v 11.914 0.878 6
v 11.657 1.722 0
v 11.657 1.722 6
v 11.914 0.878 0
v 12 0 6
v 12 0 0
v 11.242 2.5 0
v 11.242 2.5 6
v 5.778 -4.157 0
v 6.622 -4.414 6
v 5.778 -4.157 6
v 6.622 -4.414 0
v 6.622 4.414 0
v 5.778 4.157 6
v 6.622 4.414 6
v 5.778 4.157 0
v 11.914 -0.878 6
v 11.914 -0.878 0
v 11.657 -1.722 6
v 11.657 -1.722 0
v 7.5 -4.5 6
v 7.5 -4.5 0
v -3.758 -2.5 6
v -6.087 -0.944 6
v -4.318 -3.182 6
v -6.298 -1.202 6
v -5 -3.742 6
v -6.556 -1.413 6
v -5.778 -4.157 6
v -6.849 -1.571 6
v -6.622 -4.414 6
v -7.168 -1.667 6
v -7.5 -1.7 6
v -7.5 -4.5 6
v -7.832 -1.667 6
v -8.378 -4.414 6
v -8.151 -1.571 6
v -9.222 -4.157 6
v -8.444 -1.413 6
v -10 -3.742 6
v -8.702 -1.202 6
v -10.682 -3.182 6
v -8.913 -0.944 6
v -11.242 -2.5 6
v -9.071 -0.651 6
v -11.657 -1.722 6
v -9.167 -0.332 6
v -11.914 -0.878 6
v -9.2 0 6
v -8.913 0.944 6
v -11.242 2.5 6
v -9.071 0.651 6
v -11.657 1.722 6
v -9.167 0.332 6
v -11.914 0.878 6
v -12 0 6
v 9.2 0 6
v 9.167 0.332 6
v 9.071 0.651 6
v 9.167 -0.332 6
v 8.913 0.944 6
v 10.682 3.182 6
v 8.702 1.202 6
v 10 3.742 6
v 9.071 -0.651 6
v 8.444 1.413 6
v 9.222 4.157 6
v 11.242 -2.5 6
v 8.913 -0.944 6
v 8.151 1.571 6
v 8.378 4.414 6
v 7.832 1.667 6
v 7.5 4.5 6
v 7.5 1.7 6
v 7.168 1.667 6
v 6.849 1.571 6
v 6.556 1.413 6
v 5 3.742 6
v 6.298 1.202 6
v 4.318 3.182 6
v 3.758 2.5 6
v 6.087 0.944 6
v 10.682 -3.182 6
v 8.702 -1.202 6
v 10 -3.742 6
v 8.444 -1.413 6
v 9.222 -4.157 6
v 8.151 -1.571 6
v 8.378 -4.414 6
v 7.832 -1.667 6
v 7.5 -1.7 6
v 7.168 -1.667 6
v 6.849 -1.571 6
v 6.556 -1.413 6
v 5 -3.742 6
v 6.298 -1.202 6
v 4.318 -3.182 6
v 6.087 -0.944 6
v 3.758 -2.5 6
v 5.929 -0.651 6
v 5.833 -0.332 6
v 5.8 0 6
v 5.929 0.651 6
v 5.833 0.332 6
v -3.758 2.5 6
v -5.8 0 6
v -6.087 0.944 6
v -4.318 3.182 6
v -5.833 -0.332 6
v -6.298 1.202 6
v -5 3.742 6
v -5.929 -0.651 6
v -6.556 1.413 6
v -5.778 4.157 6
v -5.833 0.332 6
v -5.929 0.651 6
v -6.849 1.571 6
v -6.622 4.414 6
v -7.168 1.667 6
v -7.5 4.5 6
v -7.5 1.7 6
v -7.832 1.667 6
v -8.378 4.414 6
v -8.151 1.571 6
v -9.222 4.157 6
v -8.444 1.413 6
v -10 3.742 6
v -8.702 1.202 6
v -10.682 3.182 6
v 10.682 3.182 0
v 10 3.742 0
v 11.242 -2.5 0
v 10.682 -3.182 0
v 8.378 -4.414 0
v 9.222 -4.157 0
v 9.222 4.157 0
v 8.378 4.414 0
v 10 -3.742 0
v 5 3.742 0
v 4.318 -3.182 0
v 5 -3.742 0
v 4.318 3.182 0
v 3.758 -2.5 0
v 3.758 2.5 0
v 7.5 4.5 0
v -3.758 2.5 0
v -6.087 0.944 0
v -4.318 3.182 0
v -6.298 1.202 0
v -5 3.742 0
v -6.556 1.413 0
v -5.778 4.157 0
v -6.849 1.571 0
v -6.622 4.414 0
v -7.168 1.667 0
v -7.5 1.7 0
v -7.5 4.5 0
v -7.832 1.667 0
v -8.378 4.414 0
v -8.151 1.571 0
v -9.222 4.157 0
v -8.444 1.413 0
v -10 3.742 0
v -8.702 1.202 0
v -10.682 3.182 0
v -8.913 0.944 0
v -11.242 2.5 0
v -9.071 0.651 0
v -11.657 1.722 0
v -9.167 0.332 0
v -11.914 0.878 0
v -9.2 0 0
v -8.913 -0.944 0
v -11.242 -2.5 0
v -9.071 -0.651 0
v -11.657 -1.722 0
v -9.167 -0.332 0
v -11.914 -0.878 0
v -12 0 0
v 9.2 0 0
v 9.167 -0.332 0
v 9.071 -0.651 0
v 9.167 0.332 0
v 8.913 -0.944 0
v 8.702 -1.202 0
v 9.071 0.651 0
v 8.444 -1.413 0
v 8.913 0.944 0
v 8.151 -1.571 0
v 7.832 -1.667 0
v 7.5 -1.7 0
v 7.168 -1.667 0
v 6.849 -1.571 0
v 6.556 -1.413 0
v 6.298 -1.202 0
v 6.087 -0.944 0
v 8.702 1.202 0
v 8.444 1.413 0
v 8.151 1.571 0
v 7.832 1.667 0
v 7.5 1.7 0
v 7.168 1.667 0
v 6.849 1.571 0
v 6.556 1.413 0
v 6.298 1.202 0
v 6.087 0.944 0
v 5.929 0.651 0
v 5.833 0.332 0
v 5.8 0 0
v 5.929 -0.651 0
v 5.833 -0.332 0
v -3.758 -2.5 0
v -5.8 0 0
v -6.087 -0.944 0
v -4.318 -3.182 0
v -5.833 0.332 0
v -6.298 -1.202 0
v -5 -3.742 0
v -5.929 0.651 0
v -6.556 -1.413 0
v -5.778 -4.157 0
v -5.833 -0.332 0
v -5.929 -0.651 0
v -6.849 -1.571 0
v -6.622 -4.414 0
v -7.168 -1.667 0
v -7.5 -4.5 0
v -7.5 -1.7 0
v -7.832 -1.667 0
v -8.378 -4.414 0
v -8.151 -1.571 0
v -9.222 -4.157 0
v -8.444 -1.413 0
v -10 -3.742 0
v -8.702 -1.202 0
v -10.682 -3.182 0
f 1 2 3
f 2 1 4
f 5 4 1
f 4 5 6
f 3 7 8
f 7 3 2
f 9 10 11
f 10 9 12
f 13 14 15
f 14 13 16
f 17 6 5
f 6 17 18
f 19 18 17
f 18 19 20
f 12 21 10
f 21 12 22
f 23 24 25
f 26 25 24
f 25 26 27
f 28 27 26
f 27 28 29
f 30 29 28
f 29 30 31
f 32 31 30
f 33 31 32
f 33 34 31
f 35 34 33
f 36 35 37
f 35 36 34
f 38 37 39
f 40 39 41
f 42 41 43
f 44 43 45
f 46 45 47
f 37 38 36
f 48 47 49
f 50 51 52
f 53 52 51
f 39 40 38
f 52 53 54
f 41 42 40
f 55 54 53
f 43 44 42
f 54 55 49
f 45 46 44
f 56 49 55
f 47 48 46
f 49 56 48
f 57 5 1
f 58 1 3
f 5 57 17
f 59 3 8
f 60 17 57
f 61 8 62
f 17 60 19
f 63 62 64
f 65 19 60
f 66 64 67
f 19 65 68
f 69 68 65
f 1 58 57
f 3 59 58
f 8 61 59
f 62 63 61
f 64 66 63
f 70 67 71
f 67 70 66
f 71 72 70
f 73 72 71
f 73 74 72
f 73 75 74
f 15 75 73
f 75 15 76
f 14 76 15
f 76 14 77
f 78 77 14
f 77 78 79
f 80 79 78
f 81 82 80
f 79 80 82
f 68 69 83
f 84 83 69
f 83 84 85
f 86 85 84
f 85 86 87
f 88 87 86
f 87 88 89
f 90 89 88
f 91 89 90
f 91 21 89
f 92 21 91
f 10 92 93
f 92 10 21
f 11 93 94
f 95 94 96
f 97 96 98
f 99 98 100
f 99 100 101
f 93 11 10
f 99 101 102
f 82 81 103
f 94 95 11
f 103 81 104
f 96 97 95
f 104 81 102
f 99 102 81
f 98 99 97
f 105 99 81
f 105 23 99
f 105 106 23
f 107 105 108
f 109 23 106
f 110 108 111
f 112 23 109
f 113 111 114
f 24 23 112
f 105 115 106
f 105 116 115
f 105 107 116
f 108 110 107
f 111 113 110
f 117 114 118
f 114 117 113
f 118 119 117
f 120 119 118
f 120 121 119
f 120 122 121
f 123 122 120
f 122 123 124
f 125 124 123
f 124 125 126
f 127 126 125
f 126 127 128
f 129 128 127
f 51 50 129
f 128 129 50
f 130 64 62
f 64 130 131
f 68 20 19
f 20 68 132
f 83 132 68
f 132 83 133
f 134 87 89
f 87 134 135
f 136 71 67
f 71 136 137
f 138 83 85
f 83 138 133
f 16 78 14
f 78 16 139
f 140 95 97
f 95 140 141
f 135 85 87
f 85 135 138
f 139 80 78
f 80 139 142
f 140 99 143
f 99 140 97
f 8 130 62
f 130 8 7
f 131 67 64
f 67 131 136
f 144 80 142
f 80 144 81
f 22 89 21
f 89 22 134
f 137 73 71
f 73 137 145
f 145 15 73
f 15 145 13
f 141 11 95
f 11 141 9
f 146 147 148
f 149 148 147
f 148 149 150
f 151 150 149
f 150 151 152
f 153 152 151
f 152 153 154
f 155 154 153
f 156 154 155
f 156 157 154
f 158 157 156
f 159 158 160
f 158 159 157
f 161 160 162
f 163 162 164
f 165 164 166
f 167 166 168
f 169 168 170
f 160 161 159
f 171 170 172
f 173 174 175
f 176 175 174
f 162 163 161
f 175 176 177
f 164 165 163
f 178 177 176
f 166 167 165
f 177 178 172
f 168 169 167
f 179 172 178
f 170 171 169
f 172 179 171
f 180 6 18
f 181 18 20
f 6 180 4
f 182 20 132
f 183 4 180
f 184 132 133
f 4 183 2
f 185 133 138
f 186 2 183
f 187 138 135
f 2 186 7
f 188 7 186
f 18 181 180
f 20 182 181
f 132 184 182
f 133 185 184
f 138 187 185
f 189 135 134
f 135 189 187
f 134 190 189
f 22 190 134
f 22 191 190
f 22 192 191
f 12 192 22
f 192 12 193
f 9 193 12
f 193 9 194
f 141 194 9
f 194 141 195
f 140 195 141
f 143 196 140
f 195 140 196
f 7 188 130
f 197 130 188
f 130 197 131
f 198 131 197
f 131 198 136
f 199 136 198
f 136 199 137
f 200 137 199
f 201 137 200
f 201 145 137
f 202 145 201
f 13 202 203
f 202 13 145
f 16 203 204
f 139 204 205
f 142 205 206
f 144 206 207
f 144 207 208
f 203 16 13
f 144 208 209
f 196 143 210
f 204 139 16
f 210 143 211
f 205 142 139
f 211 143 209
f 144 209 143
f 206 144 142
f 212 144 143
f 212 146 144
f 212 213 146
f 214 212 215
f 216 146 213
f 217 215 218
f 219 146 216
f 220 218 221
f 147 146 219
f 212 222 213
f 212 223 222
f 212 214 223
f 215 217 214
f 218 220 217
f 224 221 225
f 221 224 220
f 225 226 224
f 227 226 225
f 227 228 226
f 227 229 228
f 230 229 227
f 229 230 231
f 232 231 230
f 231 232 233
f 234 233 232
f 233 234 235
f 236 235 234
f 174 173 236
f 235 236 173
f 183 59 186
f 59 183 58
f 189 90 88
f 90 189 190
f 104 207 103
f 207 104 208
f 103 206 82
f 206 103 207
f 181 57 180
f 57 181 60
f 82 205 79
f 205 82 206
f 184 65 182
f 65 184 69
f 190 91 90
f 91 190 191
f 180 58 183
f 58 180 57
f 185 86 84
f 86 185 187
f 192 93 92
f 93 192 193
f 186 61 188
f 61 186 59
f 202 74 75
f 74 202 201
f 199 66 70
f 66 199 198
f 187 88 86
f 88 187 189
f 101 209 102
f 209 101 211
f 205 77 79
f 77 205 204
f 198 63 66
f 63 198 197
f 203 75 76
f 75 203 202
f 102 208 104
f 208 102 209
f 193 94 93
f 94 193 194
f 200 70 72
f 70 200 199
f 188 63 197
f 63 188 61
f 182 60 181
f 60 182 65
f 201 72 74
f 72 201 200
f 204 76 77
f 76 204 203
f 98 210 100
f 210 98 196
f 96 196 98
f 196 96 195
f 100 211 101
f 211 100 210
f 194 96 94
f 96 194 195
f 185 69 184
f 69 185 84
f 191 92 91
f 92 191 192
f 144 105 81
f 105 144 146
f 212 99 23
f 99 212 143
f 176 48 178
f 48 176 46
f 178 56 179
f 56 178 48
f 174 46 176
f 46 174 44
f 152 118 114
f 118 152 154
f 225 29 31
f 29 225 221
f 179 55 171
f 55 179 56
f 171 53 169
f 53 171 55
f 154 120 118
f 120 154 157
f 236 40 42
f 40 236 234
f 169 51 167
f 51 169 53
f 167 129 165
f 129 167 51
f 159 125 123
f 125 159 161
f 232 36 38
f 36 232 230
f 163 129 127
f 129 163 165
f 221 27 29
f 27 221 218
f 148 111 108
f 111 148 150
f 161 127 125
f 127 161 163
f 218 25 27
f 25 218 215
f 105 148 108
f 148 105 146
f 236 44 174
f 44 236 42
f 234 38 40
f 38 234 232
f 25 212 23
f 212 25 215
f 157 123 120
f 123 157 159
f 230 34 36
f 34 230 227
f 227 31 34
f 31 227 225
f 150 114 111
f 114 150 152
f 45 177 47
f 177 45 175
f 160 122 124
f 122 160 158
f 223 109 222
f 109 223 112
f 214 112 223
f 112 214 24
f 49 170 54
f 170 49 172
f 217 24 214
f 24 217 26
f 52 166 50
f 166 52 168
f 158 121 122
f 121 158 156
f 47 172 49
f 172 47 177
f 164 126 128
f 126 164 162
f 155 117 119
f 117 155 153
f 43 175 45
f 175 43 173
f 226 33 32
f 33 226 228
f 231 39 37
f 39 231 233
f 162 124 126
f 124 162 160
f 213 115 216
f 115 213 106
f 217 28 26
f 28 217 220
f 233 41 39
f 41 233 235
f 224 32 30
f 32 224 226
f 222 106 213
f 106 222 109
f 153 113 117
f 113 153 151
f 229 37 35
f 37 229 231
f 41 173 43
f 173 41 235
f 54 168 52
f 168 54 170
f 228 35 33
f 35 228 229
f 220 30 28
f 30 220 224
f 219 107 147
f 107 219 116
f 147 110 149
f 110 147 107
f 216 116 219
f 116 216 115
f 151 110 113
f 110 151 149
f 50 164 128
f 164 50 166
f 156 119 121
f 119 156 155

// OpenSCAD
//-- pivot_joint1.scad by AndrewBCN - November 2014
//-- remix of thing #154834
//-- replaces Soporte.stl with slightly stronger,
//-- better fitting part with pivot point,
//-- and most importantly,
//-- with this OpenSCAD source file.
//-- GPL V3

joint_len=4;
$fn=32;

module half_joint() {
  translate([joint_len/2,0,6/2]) cube([4,5,6], center=true);
  difference() {
    translate([joint_len/2+5.5,0,6/2]) cylinder(r=4.5,h=6, center=true);
    // M3 hole
    translate([joint_len/2+5.5,0,6/2]) cylinder(r=3.4/2,h=30, center=true);
  }
}

// a pivot joint
module pivot_joint() {
  half_joint();
  rotate([0,0,180]) half_joint();
  %translate([0,0,6/2]) cube([joint_len,5,6], center=true);
}

// build this part
pivot_joint();
